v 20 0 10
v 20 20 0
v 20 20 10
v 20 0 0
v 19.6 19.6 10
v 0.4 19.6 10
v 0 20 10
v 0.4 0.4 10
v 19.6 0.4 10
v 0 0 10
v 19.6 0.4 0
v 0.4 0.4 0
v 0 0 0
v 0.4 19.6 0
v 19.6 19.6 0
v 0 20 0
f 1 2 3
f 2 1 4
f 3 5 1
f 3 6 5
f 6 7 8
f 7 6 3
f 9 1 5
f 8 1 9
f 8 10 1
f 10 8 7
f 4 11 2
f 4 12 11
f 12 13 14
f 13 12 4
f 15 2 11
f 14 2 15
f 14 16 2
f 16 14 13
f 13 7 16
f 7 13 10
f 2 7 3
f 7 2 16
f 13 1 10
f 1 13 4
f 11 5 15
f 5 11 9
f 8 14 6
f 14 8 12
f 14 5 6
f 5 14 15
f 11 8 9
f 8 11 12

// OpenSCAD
/* [Cube] */

height = 10; 
length = 20; 
width = 20; 

/* [Nozzle] */

thickness = 0.4; //[0.1,0.2,0.25,0.3,0.35,0.4,0.5,0.6,0.8]

difference() {
	cube([length,width,height]);
	translate([thickness,thickness,-1]) {
		cube([length-2*thickness,width-2*thickness,height+2]);
	}
}
